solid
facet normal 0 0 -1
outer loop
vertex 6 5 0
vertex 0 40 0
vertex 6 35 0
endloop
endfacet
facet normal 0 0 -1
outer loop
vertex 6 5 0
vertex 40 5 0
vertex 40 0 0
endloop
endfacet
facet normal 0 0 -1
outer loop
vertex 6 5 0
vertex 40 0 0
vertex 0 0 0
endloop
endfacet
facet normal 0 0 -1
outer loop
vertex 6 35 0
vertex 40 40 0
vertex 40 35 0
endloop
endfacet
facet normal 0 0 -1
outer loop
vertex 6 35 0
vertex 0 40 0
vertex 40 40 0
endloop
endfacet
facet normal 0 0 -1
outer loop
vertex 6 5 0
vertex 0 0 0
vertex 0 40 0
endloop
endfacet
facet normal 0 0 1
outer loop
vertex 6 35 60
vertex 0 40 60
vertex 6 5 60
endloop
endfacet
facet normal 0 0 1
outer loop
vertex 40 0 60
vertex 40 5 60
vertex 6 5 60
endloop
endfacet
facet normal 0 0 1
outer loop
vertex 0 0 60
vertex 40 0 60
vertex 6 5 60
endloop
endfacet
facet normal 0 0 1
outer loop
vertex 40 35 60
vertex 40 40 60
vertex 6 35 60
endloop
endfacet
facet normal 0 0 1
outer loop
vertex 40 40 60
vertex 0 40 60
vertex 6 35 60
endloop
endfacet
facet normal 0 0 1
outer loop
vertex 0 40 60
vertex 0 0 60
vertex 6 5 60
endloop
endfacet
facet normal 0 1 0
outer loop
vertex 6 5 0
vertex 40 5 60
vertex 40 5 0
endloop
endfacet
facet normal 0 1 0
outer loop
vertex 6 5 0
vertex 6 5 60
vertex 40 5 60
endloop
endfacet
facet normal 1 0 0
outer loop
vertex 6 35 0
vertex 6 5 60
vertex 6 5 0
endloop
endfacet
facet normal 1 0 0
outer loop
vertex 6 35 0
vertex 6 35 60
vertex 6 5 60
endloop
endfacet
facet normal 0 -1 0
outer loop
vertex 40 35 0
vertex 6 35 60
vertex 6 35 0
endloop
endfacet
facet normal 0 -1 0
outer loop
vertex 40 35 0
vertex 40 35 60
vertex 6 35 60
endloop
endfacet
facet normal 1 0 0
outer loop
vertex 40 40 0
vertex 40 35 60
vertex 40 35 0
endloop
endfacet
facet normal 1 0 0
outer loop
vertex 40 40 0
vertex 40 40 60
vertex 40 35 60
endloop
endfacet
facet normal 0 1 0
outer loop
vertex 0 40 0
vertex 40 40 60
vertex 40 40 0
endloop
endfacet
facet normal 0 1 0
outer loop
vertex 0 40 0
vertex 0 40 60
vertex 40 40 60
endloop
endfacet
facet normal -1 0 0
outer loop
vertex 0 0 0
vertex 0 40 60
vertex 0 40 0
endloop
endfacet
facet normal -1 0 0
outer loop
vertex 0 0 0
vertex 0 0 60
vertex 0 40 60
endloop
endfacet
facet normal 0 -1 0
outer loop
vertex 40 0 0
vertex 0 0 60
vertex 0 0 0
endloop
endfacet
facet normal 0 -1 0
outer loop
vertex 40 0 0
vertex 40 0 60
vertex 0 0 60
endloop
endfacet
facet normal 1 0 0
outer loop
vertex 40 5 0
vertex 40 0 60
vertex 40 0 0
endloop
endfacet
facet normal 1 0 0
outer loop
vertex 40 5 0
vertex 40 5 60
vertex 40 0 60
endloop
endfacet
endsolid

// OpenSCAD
$fn = 32;

// ----------------------------------------------------------------------
// Structural section: channel 40 x 40 mm
// ----------------------------------------------------------------------

// --- parameters (mm) ---
sec_w = 40;               // channel width, X
sec_h = 40;               // channel height, Y
flange_t = 5;             // flange thickness
web_t = 6;                // web thickness
plate_t = 60;             // cut length, Z (extrusion height)

profile = [[0, 0], [40, 0], [40, 5], [6, 5], [6, 35], [40, 35], [40, 40], [0, 40]];  // primary outline, 8 points, counter clockwise

// --- the one profile operation ---
linear_extrude(height = plate_t) polygon(points = profile);
